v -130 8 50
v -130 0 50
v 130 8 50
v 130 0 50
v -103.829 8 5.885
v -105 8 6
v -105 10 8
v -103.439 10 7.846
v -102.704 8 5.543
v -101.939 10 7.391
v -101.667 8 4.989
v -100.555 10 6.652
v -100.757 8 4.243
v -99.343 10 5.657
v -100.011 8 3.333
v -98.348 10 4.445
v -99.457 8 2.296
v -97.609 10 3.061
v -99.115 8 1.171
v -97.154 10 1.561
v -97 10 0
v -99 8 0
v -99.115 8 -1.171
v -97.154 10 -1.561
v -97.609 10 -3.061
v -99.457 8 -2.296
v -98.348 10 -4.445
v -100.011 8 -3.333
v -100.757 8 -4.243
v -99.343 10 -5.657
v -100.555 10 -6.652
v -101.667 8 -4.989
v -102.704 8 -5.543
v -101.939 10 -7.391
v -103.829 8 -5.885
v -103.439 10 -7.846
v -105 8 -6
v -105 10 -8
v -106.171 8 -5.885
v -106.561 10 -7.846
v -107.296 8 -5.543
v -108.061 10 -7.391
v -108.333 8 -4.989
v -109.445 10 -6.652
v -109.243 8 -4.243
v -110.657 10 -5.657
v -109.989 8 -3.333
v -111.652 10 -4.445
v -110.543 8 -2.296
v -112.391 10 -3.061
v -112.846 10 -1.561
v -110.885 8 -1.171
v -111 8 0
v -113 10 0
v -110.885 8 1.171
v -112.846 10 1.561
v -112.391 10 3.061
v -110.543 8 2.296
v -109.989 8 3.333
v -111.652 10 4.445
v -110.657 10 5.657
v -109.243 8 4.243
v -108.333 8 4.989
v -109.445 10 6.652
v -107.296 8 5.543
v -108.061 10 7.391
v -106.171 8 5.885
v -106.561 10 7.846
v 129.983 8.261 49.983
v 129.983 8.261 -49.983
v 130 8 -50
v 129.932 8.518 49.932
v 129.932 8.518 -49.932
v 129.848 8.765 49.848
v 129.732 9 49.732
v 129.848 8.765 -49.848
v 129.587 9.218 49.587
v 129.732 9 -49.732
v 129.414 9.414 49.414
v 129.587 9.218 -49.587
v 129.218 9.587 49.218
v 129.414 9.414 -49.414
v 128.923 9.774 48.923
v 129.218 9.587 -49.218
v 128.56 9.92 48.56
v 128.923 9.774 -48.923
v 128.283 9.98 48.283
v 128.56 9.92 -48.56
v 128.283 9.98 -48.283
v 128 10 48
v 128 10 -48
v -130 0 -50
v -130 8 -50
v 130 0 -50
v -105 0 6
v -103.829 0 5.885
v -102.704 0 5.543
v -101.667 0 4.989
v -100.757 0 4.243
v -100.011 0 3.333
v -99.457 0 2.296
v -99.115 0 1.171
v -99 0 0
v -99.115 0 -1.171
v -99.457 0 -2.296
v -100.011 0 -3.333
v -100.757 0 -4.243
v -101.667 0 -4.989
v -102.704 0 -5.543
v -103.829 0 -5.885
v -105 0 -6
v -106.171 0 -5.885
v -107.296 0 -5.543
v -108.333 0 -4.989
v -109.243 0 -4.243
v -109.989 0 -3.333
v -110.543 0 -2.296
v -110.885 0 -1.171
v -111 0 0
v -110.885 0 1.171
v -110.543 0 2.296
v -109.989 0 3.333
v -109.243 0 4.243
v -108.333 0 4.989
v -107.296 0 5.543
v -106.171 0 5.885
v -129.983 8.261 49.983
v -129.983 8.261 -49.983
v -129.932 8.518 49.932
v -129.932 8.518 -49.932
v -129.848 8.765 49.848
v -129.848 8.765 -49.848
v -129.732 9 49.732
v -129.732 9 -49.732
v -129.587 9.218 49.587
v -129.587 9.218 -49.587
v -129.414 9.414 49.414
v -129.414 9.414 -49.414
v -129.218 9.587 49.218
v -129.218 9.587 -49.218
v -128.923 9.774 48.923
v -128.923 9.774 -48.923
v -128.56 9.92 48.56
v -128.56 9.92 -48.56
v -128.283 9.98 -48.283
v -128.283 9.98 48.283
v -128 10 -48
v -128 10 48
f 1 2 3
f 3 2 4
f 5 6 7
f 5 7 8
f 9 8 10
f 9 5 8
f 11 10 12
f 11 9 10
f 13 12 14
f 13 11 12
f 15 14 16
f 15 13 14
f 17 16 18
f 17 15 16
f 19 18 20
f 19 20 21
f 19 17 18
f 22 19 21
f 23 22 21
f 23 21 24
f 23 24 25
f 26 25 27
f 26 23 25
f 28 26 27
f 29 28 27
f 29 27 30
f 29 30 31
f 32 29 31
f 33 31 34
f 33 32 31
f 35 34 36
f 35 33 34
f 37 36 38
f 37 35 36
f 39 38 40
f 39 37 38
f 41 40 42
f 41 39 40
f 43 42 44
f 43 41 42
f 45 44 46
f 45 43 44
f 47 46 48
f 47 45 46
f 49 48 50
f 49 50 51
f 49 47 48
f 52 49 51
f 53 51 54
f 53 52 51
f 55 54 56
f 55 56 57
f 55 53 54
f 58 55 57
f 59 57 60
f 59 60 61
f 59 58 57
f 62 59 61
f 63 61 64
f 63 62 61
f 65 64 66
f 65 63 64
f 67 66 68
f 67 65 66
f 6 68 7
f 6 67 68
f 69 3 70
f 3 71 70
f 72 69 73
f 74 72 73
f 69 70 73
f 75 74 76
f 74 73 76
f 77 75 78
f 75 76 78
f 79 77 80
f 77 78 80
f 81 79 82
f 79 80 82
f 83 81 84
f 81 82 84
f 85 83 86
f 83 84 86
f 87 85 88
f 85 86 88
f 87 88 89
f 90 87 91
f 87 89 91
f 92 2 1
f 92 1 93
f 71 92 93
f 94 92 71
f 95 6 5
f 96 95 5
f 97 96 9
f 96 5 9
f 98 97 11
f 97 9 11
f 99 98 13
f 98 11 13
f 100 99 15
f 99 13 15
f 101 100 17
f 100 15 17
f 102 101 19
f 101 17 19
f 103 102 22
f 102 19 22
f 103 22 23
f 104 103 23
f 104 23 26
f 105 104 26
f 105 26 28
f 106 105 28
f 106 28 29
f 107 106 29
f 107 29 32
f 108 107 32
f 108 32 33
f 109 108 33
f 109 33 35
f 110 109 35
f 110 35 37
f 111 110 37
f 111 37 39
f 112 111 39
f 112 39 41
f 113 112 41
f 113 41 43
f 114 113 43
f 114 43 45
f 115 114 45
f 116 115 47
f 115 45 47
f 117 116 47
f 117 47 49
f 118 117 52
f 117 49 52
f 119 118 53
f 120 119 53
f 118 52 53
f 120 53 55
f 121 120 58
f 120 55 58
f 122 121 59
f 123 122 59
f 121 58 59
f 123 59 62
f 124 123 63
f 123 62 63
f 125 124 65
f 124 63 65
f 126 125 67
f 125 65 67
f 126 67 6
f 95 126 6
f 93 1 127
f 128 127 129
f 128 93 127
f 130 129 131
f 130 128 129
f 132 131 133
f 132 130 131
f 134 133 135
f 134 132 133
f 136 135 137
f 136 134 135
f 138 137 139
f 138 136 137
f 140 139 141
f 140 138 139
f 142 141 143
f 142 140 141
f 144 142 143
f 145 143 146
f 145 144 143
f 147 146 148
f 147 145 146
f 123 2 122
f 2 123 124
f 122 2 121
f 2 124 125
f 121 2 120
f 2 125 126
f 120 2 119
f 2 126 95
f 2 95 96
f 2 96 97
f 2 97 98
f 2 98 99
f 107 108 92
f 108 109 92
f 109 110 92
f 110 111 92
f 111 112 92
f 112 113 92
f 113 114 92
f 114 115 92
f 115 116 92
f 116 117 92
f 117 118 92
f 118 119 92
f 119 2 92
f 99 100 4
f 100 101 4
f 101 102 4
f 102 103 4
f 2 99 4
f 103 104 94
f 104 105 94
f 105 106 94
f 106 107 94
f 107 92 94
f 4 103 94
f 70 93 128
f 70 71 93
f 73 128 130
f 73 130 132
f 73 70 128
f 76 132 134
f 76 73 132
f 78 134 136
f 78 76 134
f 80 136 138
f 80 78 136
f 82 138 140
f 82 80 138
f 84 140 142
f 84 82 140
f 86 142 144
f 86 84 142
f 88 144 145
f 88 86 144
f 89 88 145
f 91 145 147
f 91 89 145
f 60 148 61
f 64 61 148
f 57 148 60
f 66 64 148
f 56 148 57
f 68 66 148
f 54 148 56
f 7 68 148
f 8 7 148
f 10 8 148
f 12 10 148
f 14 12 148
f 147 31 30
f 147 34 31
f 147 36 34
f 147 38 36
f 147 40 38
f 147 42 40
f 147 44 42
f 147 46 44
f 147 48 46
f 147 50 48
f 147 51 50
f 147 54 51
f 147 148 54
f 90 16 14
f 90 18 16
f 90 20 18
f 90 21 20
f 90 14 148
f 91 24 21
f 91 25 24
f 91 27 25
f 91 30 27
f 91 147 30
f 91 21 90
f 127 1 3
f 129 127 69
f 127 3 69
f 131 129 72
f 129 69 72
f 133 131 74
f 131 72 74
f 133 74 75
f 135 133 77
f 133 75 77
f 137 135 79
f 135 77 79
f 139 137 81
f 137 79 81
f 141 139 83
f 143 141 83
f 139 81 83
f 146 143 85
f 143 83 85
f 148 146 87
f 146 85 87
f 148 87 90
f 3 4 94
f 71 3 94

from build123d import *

# Parameters (mm, degrees)
SKETCH1_W           = 260
SKETCH1_H           = 100
BOSS_EXTRUDE1_DEPTH = 10
FILLET1_R           = 2
SKETCH2_R           = 6
CUT_EXTRUDE1_DEPTH  = 140.642400438
CHAMFER1_SIZE       = 2


with BuildPart() as part:
    # Sketch1 → Boss-Extrude1 (new body)
    with BuildSketch(Plane(origin=(0, 0, 0), x_dir=(1, 0, 0), z_dir=(0, 1, 0))):
        Rectangle(SKETCH1_W, SKETCH1_H)
    extrude(amount=BOSS_EXTRUDE1_DEPTH)

    # Fillet1
    fillet1_edges = [part.edges().sort_by_distance(p)[0] for p in [
        (130, 10, 0),
        (0, 10, -50),
        (-130, 10, 0),
        (0, 10, 50),
    ]]
    fillet(fillet1_edges, radius=FILLET1_R)

    # Sketch2 → Cut-Extrude1 (cut, through all)
    with BuildSketch(Plane(origin=(0, 10, 0), x_dir=(1, 0, 0), z_dir=(0, 1, 0))):
        with Locations(Location((-105, 0, 0), (0, 0, 270))):
            Circle(SKETCH2_R)
    extrude(amount=-CUT_EXTRUDE1_DEPTH, mode=Mode.SUBTRACT)

    # Chamfer1
    chamfer1_edges = [part.edges().sort_by_distance(p)[0] for p in [
        (-105, 10, -6),
    ]]
    chamfer(chamfer1_edges, length=CHAMFER1_SIZE)


solid = part.part
